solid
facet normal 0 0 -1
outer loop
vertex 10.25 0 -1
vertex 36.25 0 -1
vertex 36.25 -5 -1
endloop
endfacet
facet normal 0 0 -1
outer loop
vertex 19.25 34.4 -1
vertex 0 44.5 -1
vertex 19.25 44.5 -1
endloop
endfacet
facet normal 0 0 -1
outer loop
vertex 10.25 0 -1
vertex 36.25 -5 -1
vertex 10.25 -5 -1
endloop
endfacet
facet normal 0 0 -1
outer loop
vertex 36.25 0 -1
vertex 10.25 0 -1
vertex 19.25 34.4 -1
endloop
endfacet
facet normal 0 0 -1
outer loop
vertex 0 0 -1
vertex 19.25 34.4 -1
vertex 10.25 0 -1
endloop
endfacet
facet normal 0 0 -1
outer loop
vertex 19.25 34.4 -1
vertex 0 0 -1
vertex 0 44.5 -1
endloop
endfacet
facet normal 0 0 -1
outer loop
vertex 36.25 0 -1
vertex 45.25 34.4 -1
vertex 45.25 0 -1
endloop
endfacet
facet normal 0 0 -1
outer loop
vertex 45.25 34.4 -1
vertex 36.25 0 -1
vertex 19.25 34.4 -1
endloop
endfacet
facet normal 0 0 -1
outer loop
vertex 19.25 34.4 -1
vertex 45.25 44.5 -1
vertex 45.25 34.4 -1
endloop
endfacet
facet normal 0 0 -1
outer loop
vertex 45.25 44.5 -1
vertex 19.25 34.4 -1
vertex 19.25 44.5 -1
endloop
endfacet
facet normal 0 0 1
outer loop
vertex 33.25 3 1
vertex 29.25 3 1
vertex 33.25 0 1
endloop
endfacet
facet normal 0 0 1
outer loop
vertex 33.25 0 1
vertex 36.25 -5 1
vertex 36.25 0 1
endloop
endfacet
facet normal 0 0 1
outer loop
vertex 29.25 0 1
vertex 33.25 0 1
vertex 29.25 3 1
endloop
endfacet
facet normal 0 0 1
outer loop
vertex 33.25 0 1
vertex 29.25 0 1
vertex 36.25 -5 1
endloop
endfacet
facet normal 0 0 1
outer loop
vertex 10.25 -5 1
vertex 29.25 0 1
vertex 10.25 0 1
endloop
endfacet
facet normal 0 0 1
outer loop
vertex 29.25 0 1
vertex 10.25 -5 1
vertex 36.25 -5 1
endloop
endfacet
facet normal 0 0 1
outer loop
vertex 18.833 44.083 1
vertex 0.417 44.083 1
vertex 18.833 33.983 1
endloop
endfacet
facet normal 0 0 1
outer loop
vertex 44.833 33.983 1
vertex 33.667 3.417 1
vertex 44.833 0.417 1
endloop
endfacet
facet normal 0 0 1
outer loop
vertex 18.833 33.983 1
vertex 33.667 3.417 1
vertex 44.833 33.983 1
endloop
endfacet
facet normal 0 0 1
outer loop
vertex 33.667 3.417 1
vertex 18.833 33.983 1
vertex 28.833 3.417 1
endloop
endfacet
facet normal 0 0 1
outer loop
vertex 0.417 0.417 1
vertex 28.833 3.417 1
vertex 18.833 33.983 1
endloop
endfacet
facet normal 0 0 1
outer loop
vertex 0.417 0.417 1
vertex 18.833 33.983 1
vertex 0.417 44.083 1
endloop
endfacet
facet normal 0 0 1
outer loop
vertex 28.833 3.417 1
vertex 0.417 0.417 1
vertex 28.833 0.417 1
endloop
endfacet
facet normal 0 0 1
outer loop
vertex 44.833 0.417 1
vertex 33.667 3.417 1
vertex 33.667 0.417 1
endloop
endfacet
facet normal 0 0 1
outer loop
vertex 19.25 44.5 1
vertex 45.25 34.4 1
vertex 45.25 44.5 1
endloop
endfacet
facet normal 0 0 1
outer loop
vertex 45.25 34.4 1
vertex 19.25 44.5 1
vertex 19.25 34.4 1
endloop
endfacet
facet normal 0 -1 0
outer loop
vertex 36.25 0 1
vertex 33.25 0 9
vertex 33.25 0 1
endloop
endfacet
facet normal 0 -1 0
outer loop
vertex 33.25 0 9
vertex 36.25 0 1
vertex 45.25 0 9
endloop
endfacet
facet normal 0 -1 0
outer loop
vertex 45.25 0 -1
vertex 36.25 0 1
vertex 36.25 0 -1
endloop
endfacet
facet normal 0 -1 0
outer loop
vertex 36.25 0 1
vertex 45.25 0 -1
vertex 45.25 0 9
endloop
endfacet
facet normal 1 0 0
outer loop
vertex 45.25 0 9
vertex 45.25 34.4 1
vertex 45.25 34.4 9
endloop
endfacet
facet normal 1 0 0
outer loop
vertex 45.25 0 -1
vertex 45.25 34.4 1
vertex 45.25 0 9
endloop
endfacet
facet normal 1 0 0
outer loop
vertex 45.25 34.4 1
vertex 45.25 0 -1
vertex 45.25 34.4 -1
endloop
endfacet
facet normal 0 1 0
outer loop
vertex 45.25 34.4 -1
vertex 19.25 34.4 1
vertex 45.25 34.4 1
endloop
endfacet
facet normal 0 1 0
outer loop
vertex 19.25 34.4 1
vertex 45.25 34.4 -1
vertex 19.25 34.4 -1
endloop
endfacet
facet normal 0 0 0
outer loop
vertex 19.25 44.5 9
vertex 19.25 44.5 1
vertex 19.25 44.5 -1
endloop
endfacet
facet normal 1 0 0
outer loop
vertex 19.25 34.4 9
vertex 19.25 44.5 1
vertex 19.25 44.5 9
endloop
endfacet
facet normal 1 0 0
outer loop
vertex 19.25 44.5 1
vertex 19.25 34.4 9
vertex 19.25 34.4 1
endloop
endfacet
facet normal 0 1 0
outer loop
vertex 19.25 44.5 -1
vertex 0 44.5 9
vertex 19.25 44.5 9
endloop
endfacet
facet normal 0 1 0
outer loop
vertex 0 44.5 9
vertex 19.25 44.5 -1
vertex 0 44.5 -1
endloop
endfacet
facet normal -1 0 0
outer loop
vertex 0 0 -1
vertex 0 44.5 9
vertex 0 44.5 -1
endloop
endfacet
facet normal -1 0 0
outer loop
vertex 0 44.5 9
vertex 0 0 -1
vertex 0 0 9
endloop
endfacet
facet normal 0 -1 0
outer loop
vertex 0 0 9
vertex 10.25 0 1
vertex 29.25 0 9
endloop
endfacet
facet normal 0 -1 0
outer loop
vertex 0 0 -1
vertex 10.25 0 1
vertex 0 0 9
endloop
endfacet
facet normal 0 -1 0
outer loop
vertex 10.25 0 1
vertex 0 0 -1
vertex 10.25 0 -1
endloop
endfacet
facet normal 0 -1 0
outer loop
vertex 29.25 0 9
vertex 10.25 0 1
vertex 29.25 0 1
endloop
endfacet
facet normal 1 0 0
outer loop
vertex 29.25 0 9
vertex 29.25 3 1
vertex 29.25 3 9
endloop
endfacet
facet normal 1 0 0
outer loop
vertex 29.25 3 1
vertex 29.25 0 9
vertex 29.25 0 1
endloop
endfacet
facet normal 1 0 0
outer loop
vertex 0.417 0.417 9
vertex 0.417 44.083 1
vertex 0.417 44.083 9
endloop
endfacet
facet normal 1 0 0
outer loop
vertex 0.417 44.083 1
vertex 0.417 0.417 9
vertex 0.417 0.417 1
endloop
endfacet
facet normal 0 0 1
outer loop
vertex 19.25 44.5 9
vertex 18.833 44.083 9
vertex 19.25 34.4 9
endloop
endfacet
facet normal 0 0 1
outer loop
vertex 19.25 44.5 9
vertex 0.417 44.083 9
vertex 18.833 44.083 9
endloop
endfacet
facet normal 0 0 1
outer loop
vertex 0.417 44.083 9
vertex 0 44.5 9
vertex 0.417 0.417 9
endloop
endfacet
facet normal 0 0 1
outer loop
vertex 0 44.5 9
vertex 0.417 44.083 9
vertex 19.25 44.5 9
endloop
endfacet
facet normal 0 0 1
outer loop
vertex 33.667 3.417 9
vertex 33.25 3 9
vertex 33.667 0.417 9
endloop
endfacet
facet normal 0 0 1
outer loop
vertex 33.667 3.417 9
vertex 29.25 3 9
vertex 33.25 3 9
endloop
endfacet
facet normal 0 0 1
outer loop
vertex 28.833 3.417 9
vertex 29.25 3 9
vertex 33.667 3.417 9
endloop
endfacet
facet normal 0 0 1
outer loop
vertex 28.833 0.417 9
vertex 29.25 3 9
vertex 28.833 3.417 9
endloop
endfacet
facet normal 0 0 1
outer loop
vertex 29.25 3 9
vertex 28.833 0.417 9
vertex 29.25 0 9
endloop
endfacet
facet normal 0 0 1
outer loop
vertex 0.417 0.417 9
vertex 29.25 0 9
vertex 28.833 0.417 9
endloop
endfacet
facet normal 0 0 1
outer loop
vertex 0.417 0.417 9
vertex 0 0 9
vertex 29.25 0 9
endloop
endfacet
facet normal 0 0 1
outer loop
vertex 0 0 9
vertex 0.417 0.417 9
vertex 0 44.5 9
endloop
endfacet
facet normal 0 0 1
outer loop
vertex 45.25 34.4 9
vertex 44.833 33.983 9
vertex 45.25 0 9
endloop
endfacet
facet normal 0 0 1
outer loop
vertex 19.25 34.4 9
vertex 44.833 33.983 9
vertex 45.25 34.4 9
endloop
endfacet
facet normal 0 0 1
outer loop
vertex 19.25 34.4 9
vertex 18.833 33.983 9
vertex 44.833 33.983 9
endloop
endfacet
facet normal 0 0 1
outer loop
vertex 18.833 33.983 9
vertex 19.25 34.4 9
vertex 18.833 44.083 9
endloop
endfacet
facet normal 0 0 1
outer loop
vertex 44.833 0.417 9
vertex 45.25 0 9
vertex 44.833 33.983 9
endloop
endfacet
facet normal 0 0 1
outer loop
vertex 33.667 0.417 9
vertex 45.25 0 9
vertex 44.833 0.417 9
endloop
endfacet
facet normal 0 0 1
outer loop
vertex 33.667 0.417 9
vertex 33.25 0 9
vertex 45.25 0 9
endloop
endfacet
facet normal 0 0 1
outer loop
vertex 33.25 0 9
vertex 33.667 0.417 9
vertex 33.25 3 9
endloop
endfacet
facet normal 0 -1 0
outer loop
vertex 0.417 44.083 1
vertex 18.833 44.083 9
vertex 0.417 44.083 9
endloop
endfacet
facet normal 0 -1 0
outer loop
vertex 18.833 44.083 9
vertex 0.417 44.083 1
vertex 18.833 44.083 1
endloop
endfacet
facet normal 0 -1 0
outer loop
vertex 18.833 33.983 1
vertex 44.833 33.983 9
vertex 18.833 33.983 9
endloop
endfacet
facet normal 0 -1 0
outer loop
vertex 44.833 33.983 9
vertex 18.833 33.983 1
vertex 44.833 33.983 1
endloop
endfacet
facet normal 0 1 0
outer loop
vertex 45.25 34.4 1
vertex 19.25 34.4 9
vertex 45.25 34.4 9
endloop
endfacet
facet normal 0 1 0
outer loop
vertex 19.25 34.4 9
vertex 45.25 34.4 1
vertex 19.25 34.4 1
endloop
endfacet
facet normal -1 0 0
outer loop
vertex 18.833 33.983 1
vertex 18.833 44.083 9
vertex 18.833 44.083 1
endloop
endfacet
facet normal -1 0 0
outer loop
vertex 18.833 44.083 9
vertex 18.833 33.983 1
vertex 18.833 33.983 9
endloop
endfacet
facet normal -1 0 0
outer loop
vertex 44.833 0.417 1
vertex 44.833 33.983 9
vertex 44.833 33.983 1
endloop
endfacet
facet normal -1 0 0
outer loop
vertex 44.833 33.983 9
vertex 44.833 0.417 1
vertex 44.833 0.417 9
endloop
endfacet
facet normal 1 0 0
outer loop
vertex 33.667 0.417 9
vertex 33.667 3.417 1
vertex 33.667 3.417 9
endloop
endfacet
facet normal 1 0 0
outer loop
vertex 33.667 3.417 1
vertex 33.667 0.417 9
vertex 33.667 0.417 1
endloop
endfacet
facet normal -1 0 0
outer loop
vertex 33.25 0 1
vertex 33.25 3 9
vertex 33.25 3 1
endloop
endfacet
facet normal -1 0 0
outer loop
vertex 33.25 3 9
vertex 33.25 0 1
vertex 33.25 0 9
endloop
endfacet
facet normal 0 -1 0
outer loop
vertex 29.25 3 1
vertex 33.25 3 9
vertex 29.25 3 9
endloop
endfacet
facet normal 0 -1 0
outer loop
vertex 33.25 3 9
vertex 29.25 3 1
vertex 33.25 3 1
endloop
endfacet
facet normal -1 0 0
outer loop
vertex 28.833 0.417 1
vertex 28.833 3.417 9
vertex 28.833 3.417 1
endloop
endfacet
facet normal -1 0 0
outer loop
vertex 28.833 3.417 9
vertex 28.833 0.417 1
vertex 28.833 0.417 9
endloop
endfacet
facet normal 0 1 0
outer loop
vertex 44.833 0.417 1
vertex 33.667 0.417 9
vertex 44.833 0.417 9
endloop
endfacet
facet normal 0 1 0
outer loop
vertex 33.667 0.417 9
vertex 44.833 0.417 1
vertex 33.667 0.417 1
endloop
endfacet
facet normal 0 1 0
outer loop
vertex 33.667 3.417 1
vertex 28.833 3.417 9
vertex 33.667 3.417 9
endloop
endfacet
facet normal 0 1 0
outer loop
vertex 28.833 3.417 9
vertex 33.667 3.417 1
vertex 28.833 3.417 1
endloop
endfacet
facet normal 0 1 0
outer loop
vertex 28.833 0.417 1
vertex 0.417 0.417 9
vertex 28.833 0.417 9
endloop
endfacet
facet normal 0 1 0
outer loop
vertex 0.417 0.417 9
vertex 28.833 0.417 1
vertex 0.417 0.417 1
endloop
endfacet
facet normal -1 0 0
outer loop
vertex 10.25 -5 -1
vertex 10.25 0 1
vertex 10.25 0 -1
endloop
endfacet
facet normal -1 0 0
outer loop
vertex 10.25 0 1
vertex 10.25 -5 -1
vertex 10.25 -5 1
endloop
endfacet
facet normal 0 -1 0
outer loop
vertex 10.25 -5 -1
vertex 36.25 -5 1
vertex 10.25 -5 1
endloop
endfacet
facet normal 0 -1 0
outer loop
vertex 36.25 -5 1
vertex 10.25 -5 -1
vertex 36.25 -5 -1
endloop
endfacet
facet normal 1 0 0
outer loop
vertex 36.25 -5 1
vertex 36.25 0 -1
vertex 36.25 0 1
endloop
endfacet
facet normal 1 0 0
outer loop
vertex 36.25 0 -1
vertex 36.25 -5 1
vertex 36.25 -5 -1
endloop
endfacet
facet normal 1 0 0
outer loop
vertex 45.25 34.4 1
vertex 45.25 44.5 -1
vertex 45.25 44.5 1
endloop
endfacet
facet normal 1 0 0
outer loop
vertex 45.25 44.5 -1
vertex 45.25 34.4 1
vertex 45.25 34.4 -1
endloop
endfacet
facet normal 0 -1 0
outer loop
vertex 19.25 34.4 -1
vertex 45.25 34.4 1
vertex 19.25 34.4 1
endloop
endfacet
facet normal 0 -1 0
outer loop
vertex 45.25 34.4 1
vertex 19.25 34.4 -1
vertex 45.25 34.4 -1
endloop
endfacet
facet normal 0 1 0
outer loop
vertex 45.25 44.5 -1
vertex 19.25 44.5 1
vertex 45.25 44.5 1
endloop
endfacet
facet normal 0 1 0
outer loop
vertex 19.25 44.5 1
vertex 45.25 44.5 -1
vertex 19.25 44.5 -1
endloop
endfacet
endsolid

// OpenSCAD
module InteriorWall(){color("lemonchiffon",Opacity)cube([5/12,20,8]);}
module ExteriorWall(y){color("pink",Opacity)cube([5/12,y,8]);}

Opacity=0.3;

p0=[0,0];
p1=p0+[0,44.5];
p2=p1+[19.25,0];
p3=p2+[0,-10.10];
p4=p3+[26,0];
p5=p4+[0,-34.4];
p6=p5+[-12,0];
p7=p6+[0,3];
p8=p7+[-4,0];
p9=p8+[0,-3];
p10=[0,0];
p11=[0,0];
p12=[0,0];
p13=[0,0];
p14=[0,0];
p15=[0,0];
p16=[0,0];
p17=[0,0];

a=[p0,p1,p2,p3,p4,p5,p6,p7,p8,p9];

color("Gray",0.3)linear_extrude(height = 2, center = true, convexity = 10, twist = 0)polygon(a);

raise=[0,0,1];

translate(p0)translate(raise)ExteriorWall(44.5);
translate([0,44.5,0])translate(raise)rotate([0,0,270])ExteriorWall(19.25);
translate(p1+[19.25,-10.1])translate(raise)rotate([0,0,270])ExteriorWall(26);
translate(p1+[19.25,0])translate(raise)rotate([0,0,180])ExteriorWall(10.1+5/12);
translate(p4)translate(raise)rotate([0,0,180])ExteriorWall(44.5-10.1);
translate(p5+[-12,0,0])translate(raise)ExteriorWall(3);
translate(p5+[-12-4,3,0])translate(raise)rotate([0,0,180])ExteriorWall(3);
translate(p5)rotate([0,0,90])translate(raise)ExteriorWall(12);
translate(p5+[-12+5/12,3,0])translate(raise)rotate([0,0,90])ExteriorWall(4+2*5/12);
translate(p5+[-12-4,0,0])translate(raise)rotate([0,0,90])ExteriorWall(19.25+26-12-4);


por0=[0,0];
por1=[0,5];
por2=por1+[19,0];
por3=por2+[0,3];
por4=por3+[4,0];
por5=por4+[0,-3];
por6=por5+[3,0];
por7=por6+[0,-5];

porch=[por0,por1,por2,por3,por4,por5,por6,por7];

translate([10.25,-5])color("Cornsilk",0.8)linear_extrude(height = 2, center = true, convexity = 10, twist = 0)polygon(porch);

deck0=[0,0];
deck1=deck0+[0,10.10];
deck2=deck1+[26,0];
deck3=deck2+[0,-10.10];

deck=[deck0,deck1,deck2,deck3];

translate(p3)color("Cornsilk",0.8)linear_extrude(height = 2, center = true, convexity = 10, twist = 0)polygon(deck);
